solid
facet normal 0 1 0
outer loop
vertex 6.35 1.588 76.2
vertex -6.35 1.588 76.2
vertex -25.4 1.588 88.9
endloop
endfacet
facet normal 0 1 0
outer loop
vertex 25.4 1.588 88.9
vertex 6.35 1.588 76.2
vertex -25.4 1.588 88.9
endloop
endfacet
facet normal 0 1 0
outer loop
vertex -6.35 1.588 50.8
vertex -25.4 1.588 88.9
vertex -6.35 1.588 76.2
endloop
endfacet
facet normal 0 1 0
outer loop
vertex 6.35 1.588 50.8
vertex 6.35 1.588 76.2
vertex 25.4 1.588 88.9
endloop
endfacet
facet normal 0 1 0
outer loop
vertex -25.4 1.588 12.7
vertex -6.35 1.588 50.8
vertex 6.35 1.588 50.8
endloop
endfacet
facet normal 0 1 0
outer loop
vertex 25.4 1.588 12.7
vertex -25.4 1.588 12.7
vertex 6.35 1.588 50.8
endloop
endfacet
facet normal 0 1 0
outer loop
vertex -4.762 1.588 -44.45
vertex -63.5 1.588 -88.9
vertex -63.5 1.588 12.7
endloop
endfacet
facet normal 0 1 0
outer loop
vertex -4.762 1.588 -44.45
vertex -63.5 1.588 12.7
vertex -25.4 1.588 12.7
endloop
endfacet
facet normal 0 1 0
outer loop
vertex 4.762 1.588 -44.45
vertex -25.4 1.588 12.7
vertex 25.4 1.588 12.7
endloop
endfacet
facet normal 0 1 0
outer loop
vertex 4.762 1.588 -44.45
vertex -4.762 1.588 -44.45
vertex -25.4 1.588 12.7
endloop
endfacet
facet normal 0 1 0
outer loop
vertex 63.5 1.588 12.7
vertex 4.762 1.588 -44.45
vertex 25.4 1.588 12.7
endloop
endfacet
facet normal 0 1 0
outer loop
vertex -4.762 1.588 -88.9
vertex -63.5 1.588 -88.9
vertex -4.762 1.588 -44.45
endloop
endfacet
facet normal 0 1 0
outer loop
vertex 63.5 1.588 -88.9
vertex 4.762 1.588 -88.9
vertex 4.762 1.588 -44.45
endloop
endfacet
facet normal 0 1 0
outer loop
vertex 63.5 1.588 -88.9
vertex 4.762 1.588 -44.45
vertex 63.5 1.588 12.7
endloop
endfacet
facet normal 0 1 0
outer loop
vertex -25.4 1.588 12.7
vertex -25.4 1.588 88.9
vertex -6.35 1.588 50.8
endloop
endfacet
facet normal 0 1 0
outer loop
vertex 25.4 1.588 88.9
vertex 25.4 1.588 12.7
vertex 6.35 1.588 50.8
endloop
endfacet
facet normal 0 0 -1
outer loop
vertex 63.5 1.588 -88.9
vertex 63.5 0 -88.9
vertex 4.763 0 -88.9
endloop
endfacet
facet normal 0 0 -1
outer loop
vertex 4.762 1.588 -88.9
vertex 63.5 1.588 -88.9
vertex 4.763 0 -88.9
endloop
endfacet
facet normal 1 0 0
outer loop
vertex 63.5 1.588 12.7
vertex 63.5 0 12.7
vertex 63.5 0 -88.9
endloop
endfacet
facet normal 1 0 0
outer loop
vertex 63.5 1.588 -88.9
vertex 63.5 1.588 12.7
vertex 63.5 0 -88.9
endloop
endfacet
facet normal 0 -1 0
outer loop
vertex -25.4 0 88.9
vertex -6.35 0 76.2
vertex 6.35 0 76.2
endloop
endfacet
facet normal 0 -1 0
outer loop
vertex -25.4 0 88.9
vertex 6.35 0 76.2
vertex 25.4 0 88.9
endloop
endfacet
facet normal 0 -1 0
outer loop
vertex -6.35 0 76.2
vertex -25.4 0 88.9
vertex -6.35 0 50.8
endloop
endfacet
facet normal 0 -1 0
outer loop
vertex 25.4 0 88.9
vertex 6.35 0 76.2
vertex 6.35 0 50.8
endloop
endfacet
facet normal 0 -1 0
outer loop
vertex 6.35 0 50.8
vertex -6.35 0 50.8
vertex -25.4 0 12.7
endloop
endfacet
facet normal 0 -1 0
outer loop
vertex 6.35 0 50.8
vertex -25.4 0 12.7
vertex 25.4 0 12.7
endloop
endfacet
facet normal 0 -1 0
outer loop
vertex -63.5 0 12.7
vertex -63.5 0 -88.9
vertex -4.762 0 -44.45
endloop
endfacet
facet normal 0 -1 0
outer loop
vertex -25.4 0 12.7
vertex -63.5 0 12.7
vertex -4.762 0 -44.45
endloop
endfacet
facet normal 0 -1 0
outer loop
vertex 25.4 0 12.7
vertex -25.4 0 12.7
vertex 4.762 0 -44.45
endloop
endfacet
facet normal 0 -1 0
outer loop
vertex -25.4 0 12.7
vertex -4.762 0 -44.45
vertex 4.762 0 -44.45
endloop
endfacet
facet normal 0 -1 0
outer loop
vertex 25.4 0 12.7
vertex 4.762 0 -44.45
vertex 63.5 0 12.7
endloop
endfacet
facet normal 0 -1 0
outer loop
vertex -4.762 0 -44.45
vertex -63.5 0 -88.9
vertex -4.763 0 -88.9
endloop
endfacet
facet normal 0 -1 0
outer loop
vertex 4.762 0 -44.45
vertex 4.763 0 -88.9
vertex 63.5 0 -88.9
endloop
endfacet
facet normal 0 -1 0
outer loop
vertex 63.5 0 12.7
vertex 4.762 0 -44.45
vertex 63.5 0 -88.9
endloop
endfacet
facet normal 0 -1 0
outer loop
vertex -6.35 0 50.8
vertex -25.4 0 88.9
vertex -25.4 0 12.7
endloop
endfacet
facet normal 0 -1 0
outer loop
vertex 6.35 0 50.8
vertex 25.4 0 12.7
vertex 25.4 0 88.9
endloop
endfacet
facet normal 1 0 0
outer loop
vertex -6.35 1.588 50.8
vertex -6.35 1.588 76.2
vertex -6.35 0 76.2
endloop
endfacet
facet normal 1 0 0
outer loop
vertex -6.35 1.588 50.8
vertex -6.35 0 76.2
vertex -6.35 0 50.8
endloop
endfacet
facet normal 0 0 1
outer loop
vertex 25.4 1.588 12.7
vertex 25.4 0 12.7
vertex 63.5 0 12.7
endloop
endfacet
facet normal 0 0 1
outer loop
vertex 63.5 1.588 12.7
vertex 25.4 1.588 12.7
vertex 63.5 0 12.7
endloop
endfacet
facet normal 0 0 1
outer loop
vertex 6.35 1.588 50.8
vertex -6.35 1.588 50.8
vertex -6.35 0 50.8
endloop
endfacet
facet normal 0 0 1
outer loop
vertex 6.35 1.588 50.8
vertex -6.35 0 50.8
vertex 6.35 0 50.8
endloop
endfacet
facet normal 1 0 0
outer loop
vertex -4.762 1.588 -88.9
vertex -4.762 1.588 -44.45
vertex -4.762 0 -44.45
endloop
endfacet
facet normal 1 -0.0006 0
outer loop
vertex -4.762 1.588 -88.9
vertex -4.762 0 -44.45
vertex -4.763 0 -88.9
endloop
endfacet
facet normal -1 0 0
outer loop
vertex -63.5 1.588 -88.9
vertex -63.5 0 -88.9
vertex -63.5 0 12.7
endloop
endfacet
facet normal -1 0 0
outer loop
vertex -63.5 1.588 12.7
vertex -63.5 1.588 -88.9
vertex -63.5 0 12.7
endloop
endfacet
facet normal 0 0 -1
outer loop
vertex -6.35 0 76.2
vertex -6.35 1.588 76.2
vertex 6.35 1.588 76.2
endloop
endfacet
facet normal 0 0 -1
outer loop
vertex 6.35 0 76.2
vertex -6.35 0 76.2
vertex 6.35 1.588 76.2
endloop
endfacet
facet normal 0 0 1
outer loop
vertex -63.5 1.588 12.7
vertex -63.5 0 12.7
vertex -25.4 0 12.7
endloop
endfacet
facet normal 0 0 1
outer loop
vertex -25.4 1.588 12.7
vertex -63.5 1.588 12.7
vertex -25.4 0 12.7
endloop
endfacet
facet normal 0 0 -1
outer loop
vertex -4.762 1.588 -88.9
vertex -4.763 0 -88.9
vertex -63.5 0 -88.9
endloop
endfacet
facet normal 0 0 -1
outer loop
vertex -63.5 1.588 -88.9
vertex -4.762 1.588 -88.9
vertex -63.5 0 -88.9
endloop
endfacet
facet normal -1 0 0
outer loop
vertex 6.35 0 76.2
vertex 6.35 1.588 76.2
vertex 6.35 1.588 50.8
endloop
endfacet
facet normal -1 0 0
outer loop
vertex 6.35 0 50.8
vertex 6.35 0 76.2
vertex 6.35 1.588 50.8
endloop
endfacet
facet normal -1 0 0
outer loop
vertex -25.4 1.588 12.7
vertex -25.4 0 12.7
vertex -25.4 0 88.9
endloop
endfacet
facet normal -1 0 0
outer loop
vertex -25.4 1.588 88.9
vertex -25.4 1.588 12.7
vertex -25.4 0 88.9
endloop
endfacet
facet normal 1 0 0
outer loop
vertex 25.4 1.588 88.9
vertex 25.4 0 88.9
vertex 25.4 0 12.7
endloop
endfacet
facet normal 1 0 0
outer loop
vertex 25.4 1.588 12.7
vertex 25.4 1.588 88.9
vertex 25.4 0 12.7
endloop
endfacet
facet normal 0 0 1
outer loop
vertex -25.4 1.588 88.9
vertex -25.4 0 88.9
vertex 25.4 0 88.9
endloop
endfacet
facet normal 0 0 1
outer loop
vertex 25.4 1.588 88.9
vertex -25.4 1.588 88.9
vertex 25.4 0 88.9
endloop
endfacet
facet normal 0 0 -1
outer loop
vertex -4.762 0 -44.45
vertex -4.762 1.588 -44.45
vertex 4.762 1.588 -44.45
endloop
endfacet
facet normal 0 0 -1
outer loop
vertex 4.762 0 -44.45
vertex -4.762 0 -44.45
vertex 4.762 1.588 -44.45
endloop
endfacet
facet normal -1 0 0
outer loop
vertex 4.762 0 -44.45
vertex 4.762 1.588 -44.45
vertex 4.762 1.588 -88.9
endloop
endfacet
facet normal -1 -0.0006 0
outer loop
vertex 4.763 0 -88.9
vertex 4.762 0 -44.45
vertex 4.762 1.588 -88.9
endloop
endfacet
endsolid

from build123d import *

# Parameters (mm, degrees)
BOSS_EXTRUDE1_DEPTH = 1.5875
CUT_EXTRUDE1_REACH  = 111.261
SKETCH2_W           = 12.7
SKETCH2_H           = 25.4
CUT_EXTRUDE2_REACH  = 111.261
SKETCH3_W           = 9.525
SKETCH3_H           = 44.45


with BuildPart() as part:
    # Sketch1 → Boss-Extrude1 (new body)
    with BuildSketch(Plane(origin=(0, 0, 0), x_dir=(1, 0, 0), z_dir=(0, 1, 0))):
        Polygon((-63.5, -12.7), (-25.4, -12.7), (-25.4, -88.9), (25.4, -88.9), (25.4, -12.7), (63.5, -12.7), (63.5, 88.9), (-63.5, 88.9), align=None)
    extrude(amount=BOSS_EXTRUDE1_DEPTH)

    # Sketch2 → Cut-Extrude1 (cut, up to next)
    with BuildSketch(Plane(origin=(0, 1.5875, 0), x_dir=(1, 0, 0), z_dir=(0, 1, 0)), mode=Mode.PRIVATE) as cut_extrude1_sk1:
        with Locations((0, -63.5)):
            Rectangle(SKETCH2_W, SKETCH2_H)
    cut_extrude1_tool1 = extrude(cut_extrude1_sk1.sketch, amount=-CUT_EXTRUDE1_REACH, mode=Mode.PRIVATE) & part.part
    add(cut_extrude1_tool1.solids().sort_by_distance((0, 1.5875, 63.5))[0], mode=Mode.SUBTRACT)

    # Sketch3 → Cut-Extrude2 (cut, up to next)
    with BuildSketch(Plane(origin=(0, 1.5875, 0), x_dir=(1, 0, 0), z_dir=(0, 1, 0)), mode=Mode.PRIVATE) as cut_extrude2_sk1:
        with Locations((0, 66.675)):
            Rectangle(SKETCH3_W, SKETCH3_H)
    cut_extrude2_tool1 = extrude(cut_extrude2_sk1.sketch, amount=-CUT_EXTRUDE2_REACH, mode=Mode.PRIVATE) & part.part
    add(cut_extrude2_tool1.solids().sort_by_distance((0, 1.5875, -66.675))[0], mode=Mode.SUBTRACT)


solid = part.part
